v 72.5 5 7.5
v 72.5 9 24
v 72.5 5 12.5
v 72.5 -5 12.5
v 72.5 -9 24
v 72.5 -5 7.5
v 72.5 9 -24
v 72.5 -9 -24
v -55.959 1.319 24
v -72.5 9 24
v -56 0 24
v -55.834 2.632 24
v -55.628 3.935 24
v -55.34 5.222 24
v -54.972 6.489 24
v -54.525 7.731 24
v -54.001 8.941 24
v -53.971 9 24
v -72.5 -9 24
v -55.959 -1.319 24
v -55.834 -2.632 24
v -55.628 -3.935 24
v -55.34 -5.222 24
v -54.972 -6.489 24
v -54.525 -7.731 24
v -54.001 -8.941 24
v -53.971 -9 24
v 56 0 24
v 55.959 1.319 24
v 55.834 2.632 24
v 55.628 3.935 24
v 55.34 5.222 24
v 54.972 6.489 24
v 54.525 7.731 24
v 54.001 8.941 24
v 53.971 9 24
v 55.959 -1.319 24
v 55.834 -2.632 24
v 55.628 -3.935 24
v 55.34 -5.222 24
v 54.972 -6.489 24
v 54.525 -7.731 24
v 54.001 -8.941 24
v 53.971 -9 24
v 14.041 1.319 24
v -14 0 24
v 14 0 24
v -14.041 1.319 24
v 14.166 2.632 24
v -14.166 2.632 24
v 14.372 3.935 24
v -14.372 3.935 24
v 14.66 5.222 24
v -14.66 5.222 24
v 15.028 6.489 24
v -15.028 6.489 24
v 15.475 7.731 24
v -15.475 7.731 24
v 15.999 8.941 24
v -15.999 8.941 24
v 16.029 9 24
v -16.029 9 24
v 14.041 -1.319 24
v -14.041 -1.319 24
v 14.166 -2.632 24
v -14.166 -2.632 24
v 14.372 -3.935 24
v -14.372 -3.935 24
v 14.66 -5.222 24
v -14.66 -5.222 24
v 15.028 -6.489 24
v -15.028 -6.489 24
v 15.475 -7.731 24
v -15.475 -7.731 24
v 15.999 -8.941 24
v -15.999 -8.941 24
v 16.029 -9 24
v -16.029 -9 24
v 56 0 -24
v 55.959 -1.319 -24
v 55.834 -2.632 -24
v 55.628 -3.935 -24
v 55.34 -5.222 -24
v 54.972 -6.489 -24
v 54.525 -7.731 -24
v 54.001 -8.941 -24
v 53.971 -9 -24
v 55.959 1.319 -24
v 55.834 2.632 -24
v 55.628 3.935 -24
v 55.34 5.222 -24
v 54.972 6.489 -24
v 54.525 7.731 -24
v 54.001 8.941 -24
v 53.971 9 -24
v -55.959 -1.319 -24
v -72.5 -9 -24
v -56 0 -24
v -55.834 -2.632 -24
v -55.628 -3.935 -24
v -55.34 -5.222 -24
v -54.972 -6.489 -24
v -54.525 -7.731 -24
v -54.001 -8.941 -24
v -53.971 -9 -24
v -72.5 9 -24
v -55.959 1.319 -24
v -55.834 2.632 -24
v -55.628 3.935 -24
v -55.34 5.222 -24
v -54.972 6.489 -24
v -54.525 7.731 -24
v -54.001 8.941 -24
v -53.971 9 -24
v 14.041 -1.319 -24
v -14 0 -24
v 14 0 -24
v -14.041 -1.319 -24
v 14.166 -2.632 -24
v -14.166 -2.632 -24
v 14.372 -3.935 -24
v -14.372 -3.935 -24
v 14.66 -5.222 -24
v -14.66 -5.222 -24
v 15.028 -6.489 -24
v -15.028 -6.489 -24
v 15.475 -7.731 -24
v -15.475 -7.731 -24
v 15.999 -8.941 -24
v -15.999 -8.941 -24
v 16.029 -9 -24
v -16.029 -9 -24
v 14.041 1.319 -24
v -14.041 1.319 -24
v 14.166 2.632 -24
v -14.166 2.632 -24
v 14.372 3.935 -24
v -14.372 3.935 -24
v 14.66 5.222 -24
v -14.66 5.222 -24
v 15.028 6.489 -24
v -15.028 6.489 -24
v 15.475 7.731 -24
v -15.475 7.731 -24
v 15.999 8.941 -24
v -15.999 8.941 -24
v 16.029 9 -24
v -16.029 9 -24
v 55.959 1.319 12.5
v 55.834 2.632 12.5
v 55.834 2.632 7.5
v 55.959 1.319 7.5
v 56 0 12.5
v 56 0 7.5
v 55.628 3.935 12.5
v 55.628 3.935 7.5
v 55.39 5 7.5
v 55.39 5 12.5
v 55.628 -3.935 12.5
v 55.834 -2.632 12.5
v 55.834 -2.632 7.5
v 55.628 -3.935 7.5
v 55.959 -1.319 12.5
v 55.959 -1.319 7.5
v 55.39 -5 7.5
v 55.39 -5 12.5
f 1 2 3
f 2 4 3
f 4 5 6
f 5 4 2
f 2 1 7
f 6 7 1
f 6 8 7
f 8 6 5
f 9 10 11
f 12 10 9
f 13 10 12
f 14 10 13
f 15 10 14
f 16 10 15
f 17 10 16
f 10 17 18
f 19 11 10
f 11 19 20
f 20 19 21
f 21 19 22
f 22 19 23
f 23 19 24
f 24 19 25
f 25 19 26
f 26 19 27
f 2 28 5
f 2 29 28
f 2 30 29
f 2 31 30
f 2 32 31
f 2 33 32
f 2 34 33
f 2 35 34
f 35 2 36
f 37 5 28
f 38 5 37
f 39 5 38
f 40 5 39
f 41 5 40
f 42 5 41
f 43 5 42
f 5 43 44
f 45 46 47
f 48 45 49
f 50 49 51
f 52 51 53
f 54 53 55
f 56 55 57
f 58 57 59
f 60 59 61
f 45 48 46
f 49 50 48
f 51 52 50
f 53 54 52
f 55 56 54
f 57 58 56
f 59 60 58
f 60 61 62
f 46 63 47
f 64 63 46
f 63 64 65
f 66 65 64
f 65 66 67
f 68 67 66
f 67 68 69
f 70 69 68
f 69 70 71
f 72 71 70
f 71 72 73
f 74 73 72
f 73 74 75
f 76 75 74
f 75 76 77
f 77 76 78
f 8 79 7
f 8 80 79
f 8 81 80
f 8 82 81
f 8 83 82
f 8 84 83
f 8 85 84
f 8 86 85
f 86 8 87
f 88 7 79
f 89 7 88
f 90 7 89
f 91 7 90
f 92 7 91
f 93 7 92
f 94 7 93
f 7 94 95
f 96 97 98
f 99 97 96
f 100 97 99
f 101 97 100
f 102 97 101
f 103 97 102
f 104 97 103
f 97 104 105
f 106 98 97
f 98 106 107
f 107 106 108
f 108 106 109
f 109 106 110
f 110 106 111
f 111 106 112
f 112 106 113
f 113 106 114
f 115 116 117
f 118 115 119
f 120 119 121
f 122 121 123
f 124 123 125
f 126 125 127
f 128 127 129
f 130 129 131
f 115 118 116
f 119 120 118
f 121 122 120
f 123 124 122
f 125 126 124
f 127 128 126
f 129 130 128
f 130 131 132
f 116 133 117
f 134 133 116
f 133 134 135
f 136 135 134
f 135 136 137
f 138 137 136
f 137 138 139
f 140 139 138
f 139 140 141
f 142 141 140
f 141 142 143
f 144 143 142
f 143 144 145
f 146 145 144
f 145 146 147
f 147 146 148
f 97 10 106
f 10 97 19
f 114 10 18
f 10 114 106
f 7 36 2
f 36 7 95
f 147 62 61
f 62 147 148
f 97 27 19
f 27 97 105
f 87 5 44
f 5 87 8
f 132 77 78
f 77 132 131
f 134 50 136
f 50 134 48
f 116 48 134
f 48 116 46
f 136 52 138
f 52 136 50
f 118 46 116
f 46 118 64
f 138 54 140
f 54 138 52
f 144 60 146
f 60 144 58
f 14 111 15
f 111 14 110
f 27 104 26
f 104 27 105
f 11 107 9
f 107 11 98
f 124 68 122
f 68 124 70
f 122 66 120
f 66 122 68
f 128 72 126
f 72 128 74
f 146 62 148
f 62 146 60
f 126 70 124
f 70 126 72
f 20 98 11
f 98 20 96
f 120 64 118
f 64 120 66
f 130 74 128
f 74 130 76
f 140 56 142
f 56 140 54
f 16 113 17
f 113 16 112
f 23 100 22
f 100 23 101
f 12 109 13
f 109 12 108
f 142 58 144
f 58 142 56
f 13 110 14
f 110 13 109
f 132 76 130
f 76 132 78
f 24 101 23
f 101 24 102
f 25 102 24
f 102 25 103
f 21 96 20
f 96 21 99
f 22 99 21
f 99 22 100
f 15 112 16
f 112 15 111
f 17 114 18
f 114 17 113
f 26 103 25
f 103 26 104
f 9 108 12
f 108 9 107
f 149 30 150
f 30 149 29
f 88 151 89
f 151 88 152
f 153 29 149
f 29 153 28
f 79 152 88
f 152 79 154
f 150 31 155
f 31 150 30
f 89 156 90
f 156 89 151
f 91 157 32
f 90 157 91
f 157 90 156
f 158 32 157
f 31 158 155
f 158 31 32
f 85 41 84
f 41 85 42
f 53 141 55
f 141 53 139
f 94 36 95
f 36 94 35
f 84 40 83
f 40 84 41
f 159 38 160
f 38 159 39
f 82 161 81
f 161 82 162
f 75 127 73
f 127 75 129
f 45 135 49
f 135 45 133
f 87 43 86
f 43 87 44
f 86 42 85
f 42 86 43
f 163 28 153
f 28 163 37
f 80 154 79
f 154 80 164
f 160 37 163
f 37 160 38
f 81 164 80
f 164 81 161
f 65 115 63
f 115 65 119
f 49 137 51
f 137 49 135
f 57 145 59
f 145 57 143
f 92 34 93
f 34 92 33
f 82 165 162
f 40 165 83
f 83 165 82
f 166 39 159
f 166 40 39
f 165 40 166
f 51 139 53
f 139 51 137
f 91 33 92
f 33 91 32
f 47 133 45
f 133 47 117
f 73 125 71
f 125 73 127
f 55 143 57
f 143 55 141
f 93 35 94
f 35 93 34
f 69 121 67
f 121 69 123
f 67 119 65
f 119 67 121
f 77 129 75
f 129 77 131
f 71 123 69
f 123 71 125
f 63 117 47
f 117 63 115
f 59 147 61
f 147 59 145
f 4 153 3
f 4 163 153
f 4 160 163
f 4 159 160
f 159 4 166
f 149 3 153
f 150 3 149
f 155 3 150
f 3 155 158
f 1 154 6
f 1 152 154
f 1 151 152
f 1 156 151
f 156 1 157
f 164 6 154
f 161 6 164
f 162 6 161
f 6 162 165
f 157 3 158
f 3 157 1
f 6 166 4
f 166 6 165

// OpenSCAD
// Meta Shades - Parametric Glass Frame Shell
$fn = 100;

module glasses_frame() {
    difference() {
        // Main Front Outer Housing
        cube([145, 18, 48], center=true);
        
        // Left Lens Optical Cutout
        translate([-35, 0, 0])
            cylinder(h=50, r=21, center=true);
            
        // Right Lens Optical Cutout
        translate([35, 0, 0])
            cylinder(h=50, r=21, center=true);
            
        // Temple EEG Electrode Wire Channel
        translate([65, 0, 10])
            cube([20, 10, 5], center=true);
    }
}

glasses_frame();
